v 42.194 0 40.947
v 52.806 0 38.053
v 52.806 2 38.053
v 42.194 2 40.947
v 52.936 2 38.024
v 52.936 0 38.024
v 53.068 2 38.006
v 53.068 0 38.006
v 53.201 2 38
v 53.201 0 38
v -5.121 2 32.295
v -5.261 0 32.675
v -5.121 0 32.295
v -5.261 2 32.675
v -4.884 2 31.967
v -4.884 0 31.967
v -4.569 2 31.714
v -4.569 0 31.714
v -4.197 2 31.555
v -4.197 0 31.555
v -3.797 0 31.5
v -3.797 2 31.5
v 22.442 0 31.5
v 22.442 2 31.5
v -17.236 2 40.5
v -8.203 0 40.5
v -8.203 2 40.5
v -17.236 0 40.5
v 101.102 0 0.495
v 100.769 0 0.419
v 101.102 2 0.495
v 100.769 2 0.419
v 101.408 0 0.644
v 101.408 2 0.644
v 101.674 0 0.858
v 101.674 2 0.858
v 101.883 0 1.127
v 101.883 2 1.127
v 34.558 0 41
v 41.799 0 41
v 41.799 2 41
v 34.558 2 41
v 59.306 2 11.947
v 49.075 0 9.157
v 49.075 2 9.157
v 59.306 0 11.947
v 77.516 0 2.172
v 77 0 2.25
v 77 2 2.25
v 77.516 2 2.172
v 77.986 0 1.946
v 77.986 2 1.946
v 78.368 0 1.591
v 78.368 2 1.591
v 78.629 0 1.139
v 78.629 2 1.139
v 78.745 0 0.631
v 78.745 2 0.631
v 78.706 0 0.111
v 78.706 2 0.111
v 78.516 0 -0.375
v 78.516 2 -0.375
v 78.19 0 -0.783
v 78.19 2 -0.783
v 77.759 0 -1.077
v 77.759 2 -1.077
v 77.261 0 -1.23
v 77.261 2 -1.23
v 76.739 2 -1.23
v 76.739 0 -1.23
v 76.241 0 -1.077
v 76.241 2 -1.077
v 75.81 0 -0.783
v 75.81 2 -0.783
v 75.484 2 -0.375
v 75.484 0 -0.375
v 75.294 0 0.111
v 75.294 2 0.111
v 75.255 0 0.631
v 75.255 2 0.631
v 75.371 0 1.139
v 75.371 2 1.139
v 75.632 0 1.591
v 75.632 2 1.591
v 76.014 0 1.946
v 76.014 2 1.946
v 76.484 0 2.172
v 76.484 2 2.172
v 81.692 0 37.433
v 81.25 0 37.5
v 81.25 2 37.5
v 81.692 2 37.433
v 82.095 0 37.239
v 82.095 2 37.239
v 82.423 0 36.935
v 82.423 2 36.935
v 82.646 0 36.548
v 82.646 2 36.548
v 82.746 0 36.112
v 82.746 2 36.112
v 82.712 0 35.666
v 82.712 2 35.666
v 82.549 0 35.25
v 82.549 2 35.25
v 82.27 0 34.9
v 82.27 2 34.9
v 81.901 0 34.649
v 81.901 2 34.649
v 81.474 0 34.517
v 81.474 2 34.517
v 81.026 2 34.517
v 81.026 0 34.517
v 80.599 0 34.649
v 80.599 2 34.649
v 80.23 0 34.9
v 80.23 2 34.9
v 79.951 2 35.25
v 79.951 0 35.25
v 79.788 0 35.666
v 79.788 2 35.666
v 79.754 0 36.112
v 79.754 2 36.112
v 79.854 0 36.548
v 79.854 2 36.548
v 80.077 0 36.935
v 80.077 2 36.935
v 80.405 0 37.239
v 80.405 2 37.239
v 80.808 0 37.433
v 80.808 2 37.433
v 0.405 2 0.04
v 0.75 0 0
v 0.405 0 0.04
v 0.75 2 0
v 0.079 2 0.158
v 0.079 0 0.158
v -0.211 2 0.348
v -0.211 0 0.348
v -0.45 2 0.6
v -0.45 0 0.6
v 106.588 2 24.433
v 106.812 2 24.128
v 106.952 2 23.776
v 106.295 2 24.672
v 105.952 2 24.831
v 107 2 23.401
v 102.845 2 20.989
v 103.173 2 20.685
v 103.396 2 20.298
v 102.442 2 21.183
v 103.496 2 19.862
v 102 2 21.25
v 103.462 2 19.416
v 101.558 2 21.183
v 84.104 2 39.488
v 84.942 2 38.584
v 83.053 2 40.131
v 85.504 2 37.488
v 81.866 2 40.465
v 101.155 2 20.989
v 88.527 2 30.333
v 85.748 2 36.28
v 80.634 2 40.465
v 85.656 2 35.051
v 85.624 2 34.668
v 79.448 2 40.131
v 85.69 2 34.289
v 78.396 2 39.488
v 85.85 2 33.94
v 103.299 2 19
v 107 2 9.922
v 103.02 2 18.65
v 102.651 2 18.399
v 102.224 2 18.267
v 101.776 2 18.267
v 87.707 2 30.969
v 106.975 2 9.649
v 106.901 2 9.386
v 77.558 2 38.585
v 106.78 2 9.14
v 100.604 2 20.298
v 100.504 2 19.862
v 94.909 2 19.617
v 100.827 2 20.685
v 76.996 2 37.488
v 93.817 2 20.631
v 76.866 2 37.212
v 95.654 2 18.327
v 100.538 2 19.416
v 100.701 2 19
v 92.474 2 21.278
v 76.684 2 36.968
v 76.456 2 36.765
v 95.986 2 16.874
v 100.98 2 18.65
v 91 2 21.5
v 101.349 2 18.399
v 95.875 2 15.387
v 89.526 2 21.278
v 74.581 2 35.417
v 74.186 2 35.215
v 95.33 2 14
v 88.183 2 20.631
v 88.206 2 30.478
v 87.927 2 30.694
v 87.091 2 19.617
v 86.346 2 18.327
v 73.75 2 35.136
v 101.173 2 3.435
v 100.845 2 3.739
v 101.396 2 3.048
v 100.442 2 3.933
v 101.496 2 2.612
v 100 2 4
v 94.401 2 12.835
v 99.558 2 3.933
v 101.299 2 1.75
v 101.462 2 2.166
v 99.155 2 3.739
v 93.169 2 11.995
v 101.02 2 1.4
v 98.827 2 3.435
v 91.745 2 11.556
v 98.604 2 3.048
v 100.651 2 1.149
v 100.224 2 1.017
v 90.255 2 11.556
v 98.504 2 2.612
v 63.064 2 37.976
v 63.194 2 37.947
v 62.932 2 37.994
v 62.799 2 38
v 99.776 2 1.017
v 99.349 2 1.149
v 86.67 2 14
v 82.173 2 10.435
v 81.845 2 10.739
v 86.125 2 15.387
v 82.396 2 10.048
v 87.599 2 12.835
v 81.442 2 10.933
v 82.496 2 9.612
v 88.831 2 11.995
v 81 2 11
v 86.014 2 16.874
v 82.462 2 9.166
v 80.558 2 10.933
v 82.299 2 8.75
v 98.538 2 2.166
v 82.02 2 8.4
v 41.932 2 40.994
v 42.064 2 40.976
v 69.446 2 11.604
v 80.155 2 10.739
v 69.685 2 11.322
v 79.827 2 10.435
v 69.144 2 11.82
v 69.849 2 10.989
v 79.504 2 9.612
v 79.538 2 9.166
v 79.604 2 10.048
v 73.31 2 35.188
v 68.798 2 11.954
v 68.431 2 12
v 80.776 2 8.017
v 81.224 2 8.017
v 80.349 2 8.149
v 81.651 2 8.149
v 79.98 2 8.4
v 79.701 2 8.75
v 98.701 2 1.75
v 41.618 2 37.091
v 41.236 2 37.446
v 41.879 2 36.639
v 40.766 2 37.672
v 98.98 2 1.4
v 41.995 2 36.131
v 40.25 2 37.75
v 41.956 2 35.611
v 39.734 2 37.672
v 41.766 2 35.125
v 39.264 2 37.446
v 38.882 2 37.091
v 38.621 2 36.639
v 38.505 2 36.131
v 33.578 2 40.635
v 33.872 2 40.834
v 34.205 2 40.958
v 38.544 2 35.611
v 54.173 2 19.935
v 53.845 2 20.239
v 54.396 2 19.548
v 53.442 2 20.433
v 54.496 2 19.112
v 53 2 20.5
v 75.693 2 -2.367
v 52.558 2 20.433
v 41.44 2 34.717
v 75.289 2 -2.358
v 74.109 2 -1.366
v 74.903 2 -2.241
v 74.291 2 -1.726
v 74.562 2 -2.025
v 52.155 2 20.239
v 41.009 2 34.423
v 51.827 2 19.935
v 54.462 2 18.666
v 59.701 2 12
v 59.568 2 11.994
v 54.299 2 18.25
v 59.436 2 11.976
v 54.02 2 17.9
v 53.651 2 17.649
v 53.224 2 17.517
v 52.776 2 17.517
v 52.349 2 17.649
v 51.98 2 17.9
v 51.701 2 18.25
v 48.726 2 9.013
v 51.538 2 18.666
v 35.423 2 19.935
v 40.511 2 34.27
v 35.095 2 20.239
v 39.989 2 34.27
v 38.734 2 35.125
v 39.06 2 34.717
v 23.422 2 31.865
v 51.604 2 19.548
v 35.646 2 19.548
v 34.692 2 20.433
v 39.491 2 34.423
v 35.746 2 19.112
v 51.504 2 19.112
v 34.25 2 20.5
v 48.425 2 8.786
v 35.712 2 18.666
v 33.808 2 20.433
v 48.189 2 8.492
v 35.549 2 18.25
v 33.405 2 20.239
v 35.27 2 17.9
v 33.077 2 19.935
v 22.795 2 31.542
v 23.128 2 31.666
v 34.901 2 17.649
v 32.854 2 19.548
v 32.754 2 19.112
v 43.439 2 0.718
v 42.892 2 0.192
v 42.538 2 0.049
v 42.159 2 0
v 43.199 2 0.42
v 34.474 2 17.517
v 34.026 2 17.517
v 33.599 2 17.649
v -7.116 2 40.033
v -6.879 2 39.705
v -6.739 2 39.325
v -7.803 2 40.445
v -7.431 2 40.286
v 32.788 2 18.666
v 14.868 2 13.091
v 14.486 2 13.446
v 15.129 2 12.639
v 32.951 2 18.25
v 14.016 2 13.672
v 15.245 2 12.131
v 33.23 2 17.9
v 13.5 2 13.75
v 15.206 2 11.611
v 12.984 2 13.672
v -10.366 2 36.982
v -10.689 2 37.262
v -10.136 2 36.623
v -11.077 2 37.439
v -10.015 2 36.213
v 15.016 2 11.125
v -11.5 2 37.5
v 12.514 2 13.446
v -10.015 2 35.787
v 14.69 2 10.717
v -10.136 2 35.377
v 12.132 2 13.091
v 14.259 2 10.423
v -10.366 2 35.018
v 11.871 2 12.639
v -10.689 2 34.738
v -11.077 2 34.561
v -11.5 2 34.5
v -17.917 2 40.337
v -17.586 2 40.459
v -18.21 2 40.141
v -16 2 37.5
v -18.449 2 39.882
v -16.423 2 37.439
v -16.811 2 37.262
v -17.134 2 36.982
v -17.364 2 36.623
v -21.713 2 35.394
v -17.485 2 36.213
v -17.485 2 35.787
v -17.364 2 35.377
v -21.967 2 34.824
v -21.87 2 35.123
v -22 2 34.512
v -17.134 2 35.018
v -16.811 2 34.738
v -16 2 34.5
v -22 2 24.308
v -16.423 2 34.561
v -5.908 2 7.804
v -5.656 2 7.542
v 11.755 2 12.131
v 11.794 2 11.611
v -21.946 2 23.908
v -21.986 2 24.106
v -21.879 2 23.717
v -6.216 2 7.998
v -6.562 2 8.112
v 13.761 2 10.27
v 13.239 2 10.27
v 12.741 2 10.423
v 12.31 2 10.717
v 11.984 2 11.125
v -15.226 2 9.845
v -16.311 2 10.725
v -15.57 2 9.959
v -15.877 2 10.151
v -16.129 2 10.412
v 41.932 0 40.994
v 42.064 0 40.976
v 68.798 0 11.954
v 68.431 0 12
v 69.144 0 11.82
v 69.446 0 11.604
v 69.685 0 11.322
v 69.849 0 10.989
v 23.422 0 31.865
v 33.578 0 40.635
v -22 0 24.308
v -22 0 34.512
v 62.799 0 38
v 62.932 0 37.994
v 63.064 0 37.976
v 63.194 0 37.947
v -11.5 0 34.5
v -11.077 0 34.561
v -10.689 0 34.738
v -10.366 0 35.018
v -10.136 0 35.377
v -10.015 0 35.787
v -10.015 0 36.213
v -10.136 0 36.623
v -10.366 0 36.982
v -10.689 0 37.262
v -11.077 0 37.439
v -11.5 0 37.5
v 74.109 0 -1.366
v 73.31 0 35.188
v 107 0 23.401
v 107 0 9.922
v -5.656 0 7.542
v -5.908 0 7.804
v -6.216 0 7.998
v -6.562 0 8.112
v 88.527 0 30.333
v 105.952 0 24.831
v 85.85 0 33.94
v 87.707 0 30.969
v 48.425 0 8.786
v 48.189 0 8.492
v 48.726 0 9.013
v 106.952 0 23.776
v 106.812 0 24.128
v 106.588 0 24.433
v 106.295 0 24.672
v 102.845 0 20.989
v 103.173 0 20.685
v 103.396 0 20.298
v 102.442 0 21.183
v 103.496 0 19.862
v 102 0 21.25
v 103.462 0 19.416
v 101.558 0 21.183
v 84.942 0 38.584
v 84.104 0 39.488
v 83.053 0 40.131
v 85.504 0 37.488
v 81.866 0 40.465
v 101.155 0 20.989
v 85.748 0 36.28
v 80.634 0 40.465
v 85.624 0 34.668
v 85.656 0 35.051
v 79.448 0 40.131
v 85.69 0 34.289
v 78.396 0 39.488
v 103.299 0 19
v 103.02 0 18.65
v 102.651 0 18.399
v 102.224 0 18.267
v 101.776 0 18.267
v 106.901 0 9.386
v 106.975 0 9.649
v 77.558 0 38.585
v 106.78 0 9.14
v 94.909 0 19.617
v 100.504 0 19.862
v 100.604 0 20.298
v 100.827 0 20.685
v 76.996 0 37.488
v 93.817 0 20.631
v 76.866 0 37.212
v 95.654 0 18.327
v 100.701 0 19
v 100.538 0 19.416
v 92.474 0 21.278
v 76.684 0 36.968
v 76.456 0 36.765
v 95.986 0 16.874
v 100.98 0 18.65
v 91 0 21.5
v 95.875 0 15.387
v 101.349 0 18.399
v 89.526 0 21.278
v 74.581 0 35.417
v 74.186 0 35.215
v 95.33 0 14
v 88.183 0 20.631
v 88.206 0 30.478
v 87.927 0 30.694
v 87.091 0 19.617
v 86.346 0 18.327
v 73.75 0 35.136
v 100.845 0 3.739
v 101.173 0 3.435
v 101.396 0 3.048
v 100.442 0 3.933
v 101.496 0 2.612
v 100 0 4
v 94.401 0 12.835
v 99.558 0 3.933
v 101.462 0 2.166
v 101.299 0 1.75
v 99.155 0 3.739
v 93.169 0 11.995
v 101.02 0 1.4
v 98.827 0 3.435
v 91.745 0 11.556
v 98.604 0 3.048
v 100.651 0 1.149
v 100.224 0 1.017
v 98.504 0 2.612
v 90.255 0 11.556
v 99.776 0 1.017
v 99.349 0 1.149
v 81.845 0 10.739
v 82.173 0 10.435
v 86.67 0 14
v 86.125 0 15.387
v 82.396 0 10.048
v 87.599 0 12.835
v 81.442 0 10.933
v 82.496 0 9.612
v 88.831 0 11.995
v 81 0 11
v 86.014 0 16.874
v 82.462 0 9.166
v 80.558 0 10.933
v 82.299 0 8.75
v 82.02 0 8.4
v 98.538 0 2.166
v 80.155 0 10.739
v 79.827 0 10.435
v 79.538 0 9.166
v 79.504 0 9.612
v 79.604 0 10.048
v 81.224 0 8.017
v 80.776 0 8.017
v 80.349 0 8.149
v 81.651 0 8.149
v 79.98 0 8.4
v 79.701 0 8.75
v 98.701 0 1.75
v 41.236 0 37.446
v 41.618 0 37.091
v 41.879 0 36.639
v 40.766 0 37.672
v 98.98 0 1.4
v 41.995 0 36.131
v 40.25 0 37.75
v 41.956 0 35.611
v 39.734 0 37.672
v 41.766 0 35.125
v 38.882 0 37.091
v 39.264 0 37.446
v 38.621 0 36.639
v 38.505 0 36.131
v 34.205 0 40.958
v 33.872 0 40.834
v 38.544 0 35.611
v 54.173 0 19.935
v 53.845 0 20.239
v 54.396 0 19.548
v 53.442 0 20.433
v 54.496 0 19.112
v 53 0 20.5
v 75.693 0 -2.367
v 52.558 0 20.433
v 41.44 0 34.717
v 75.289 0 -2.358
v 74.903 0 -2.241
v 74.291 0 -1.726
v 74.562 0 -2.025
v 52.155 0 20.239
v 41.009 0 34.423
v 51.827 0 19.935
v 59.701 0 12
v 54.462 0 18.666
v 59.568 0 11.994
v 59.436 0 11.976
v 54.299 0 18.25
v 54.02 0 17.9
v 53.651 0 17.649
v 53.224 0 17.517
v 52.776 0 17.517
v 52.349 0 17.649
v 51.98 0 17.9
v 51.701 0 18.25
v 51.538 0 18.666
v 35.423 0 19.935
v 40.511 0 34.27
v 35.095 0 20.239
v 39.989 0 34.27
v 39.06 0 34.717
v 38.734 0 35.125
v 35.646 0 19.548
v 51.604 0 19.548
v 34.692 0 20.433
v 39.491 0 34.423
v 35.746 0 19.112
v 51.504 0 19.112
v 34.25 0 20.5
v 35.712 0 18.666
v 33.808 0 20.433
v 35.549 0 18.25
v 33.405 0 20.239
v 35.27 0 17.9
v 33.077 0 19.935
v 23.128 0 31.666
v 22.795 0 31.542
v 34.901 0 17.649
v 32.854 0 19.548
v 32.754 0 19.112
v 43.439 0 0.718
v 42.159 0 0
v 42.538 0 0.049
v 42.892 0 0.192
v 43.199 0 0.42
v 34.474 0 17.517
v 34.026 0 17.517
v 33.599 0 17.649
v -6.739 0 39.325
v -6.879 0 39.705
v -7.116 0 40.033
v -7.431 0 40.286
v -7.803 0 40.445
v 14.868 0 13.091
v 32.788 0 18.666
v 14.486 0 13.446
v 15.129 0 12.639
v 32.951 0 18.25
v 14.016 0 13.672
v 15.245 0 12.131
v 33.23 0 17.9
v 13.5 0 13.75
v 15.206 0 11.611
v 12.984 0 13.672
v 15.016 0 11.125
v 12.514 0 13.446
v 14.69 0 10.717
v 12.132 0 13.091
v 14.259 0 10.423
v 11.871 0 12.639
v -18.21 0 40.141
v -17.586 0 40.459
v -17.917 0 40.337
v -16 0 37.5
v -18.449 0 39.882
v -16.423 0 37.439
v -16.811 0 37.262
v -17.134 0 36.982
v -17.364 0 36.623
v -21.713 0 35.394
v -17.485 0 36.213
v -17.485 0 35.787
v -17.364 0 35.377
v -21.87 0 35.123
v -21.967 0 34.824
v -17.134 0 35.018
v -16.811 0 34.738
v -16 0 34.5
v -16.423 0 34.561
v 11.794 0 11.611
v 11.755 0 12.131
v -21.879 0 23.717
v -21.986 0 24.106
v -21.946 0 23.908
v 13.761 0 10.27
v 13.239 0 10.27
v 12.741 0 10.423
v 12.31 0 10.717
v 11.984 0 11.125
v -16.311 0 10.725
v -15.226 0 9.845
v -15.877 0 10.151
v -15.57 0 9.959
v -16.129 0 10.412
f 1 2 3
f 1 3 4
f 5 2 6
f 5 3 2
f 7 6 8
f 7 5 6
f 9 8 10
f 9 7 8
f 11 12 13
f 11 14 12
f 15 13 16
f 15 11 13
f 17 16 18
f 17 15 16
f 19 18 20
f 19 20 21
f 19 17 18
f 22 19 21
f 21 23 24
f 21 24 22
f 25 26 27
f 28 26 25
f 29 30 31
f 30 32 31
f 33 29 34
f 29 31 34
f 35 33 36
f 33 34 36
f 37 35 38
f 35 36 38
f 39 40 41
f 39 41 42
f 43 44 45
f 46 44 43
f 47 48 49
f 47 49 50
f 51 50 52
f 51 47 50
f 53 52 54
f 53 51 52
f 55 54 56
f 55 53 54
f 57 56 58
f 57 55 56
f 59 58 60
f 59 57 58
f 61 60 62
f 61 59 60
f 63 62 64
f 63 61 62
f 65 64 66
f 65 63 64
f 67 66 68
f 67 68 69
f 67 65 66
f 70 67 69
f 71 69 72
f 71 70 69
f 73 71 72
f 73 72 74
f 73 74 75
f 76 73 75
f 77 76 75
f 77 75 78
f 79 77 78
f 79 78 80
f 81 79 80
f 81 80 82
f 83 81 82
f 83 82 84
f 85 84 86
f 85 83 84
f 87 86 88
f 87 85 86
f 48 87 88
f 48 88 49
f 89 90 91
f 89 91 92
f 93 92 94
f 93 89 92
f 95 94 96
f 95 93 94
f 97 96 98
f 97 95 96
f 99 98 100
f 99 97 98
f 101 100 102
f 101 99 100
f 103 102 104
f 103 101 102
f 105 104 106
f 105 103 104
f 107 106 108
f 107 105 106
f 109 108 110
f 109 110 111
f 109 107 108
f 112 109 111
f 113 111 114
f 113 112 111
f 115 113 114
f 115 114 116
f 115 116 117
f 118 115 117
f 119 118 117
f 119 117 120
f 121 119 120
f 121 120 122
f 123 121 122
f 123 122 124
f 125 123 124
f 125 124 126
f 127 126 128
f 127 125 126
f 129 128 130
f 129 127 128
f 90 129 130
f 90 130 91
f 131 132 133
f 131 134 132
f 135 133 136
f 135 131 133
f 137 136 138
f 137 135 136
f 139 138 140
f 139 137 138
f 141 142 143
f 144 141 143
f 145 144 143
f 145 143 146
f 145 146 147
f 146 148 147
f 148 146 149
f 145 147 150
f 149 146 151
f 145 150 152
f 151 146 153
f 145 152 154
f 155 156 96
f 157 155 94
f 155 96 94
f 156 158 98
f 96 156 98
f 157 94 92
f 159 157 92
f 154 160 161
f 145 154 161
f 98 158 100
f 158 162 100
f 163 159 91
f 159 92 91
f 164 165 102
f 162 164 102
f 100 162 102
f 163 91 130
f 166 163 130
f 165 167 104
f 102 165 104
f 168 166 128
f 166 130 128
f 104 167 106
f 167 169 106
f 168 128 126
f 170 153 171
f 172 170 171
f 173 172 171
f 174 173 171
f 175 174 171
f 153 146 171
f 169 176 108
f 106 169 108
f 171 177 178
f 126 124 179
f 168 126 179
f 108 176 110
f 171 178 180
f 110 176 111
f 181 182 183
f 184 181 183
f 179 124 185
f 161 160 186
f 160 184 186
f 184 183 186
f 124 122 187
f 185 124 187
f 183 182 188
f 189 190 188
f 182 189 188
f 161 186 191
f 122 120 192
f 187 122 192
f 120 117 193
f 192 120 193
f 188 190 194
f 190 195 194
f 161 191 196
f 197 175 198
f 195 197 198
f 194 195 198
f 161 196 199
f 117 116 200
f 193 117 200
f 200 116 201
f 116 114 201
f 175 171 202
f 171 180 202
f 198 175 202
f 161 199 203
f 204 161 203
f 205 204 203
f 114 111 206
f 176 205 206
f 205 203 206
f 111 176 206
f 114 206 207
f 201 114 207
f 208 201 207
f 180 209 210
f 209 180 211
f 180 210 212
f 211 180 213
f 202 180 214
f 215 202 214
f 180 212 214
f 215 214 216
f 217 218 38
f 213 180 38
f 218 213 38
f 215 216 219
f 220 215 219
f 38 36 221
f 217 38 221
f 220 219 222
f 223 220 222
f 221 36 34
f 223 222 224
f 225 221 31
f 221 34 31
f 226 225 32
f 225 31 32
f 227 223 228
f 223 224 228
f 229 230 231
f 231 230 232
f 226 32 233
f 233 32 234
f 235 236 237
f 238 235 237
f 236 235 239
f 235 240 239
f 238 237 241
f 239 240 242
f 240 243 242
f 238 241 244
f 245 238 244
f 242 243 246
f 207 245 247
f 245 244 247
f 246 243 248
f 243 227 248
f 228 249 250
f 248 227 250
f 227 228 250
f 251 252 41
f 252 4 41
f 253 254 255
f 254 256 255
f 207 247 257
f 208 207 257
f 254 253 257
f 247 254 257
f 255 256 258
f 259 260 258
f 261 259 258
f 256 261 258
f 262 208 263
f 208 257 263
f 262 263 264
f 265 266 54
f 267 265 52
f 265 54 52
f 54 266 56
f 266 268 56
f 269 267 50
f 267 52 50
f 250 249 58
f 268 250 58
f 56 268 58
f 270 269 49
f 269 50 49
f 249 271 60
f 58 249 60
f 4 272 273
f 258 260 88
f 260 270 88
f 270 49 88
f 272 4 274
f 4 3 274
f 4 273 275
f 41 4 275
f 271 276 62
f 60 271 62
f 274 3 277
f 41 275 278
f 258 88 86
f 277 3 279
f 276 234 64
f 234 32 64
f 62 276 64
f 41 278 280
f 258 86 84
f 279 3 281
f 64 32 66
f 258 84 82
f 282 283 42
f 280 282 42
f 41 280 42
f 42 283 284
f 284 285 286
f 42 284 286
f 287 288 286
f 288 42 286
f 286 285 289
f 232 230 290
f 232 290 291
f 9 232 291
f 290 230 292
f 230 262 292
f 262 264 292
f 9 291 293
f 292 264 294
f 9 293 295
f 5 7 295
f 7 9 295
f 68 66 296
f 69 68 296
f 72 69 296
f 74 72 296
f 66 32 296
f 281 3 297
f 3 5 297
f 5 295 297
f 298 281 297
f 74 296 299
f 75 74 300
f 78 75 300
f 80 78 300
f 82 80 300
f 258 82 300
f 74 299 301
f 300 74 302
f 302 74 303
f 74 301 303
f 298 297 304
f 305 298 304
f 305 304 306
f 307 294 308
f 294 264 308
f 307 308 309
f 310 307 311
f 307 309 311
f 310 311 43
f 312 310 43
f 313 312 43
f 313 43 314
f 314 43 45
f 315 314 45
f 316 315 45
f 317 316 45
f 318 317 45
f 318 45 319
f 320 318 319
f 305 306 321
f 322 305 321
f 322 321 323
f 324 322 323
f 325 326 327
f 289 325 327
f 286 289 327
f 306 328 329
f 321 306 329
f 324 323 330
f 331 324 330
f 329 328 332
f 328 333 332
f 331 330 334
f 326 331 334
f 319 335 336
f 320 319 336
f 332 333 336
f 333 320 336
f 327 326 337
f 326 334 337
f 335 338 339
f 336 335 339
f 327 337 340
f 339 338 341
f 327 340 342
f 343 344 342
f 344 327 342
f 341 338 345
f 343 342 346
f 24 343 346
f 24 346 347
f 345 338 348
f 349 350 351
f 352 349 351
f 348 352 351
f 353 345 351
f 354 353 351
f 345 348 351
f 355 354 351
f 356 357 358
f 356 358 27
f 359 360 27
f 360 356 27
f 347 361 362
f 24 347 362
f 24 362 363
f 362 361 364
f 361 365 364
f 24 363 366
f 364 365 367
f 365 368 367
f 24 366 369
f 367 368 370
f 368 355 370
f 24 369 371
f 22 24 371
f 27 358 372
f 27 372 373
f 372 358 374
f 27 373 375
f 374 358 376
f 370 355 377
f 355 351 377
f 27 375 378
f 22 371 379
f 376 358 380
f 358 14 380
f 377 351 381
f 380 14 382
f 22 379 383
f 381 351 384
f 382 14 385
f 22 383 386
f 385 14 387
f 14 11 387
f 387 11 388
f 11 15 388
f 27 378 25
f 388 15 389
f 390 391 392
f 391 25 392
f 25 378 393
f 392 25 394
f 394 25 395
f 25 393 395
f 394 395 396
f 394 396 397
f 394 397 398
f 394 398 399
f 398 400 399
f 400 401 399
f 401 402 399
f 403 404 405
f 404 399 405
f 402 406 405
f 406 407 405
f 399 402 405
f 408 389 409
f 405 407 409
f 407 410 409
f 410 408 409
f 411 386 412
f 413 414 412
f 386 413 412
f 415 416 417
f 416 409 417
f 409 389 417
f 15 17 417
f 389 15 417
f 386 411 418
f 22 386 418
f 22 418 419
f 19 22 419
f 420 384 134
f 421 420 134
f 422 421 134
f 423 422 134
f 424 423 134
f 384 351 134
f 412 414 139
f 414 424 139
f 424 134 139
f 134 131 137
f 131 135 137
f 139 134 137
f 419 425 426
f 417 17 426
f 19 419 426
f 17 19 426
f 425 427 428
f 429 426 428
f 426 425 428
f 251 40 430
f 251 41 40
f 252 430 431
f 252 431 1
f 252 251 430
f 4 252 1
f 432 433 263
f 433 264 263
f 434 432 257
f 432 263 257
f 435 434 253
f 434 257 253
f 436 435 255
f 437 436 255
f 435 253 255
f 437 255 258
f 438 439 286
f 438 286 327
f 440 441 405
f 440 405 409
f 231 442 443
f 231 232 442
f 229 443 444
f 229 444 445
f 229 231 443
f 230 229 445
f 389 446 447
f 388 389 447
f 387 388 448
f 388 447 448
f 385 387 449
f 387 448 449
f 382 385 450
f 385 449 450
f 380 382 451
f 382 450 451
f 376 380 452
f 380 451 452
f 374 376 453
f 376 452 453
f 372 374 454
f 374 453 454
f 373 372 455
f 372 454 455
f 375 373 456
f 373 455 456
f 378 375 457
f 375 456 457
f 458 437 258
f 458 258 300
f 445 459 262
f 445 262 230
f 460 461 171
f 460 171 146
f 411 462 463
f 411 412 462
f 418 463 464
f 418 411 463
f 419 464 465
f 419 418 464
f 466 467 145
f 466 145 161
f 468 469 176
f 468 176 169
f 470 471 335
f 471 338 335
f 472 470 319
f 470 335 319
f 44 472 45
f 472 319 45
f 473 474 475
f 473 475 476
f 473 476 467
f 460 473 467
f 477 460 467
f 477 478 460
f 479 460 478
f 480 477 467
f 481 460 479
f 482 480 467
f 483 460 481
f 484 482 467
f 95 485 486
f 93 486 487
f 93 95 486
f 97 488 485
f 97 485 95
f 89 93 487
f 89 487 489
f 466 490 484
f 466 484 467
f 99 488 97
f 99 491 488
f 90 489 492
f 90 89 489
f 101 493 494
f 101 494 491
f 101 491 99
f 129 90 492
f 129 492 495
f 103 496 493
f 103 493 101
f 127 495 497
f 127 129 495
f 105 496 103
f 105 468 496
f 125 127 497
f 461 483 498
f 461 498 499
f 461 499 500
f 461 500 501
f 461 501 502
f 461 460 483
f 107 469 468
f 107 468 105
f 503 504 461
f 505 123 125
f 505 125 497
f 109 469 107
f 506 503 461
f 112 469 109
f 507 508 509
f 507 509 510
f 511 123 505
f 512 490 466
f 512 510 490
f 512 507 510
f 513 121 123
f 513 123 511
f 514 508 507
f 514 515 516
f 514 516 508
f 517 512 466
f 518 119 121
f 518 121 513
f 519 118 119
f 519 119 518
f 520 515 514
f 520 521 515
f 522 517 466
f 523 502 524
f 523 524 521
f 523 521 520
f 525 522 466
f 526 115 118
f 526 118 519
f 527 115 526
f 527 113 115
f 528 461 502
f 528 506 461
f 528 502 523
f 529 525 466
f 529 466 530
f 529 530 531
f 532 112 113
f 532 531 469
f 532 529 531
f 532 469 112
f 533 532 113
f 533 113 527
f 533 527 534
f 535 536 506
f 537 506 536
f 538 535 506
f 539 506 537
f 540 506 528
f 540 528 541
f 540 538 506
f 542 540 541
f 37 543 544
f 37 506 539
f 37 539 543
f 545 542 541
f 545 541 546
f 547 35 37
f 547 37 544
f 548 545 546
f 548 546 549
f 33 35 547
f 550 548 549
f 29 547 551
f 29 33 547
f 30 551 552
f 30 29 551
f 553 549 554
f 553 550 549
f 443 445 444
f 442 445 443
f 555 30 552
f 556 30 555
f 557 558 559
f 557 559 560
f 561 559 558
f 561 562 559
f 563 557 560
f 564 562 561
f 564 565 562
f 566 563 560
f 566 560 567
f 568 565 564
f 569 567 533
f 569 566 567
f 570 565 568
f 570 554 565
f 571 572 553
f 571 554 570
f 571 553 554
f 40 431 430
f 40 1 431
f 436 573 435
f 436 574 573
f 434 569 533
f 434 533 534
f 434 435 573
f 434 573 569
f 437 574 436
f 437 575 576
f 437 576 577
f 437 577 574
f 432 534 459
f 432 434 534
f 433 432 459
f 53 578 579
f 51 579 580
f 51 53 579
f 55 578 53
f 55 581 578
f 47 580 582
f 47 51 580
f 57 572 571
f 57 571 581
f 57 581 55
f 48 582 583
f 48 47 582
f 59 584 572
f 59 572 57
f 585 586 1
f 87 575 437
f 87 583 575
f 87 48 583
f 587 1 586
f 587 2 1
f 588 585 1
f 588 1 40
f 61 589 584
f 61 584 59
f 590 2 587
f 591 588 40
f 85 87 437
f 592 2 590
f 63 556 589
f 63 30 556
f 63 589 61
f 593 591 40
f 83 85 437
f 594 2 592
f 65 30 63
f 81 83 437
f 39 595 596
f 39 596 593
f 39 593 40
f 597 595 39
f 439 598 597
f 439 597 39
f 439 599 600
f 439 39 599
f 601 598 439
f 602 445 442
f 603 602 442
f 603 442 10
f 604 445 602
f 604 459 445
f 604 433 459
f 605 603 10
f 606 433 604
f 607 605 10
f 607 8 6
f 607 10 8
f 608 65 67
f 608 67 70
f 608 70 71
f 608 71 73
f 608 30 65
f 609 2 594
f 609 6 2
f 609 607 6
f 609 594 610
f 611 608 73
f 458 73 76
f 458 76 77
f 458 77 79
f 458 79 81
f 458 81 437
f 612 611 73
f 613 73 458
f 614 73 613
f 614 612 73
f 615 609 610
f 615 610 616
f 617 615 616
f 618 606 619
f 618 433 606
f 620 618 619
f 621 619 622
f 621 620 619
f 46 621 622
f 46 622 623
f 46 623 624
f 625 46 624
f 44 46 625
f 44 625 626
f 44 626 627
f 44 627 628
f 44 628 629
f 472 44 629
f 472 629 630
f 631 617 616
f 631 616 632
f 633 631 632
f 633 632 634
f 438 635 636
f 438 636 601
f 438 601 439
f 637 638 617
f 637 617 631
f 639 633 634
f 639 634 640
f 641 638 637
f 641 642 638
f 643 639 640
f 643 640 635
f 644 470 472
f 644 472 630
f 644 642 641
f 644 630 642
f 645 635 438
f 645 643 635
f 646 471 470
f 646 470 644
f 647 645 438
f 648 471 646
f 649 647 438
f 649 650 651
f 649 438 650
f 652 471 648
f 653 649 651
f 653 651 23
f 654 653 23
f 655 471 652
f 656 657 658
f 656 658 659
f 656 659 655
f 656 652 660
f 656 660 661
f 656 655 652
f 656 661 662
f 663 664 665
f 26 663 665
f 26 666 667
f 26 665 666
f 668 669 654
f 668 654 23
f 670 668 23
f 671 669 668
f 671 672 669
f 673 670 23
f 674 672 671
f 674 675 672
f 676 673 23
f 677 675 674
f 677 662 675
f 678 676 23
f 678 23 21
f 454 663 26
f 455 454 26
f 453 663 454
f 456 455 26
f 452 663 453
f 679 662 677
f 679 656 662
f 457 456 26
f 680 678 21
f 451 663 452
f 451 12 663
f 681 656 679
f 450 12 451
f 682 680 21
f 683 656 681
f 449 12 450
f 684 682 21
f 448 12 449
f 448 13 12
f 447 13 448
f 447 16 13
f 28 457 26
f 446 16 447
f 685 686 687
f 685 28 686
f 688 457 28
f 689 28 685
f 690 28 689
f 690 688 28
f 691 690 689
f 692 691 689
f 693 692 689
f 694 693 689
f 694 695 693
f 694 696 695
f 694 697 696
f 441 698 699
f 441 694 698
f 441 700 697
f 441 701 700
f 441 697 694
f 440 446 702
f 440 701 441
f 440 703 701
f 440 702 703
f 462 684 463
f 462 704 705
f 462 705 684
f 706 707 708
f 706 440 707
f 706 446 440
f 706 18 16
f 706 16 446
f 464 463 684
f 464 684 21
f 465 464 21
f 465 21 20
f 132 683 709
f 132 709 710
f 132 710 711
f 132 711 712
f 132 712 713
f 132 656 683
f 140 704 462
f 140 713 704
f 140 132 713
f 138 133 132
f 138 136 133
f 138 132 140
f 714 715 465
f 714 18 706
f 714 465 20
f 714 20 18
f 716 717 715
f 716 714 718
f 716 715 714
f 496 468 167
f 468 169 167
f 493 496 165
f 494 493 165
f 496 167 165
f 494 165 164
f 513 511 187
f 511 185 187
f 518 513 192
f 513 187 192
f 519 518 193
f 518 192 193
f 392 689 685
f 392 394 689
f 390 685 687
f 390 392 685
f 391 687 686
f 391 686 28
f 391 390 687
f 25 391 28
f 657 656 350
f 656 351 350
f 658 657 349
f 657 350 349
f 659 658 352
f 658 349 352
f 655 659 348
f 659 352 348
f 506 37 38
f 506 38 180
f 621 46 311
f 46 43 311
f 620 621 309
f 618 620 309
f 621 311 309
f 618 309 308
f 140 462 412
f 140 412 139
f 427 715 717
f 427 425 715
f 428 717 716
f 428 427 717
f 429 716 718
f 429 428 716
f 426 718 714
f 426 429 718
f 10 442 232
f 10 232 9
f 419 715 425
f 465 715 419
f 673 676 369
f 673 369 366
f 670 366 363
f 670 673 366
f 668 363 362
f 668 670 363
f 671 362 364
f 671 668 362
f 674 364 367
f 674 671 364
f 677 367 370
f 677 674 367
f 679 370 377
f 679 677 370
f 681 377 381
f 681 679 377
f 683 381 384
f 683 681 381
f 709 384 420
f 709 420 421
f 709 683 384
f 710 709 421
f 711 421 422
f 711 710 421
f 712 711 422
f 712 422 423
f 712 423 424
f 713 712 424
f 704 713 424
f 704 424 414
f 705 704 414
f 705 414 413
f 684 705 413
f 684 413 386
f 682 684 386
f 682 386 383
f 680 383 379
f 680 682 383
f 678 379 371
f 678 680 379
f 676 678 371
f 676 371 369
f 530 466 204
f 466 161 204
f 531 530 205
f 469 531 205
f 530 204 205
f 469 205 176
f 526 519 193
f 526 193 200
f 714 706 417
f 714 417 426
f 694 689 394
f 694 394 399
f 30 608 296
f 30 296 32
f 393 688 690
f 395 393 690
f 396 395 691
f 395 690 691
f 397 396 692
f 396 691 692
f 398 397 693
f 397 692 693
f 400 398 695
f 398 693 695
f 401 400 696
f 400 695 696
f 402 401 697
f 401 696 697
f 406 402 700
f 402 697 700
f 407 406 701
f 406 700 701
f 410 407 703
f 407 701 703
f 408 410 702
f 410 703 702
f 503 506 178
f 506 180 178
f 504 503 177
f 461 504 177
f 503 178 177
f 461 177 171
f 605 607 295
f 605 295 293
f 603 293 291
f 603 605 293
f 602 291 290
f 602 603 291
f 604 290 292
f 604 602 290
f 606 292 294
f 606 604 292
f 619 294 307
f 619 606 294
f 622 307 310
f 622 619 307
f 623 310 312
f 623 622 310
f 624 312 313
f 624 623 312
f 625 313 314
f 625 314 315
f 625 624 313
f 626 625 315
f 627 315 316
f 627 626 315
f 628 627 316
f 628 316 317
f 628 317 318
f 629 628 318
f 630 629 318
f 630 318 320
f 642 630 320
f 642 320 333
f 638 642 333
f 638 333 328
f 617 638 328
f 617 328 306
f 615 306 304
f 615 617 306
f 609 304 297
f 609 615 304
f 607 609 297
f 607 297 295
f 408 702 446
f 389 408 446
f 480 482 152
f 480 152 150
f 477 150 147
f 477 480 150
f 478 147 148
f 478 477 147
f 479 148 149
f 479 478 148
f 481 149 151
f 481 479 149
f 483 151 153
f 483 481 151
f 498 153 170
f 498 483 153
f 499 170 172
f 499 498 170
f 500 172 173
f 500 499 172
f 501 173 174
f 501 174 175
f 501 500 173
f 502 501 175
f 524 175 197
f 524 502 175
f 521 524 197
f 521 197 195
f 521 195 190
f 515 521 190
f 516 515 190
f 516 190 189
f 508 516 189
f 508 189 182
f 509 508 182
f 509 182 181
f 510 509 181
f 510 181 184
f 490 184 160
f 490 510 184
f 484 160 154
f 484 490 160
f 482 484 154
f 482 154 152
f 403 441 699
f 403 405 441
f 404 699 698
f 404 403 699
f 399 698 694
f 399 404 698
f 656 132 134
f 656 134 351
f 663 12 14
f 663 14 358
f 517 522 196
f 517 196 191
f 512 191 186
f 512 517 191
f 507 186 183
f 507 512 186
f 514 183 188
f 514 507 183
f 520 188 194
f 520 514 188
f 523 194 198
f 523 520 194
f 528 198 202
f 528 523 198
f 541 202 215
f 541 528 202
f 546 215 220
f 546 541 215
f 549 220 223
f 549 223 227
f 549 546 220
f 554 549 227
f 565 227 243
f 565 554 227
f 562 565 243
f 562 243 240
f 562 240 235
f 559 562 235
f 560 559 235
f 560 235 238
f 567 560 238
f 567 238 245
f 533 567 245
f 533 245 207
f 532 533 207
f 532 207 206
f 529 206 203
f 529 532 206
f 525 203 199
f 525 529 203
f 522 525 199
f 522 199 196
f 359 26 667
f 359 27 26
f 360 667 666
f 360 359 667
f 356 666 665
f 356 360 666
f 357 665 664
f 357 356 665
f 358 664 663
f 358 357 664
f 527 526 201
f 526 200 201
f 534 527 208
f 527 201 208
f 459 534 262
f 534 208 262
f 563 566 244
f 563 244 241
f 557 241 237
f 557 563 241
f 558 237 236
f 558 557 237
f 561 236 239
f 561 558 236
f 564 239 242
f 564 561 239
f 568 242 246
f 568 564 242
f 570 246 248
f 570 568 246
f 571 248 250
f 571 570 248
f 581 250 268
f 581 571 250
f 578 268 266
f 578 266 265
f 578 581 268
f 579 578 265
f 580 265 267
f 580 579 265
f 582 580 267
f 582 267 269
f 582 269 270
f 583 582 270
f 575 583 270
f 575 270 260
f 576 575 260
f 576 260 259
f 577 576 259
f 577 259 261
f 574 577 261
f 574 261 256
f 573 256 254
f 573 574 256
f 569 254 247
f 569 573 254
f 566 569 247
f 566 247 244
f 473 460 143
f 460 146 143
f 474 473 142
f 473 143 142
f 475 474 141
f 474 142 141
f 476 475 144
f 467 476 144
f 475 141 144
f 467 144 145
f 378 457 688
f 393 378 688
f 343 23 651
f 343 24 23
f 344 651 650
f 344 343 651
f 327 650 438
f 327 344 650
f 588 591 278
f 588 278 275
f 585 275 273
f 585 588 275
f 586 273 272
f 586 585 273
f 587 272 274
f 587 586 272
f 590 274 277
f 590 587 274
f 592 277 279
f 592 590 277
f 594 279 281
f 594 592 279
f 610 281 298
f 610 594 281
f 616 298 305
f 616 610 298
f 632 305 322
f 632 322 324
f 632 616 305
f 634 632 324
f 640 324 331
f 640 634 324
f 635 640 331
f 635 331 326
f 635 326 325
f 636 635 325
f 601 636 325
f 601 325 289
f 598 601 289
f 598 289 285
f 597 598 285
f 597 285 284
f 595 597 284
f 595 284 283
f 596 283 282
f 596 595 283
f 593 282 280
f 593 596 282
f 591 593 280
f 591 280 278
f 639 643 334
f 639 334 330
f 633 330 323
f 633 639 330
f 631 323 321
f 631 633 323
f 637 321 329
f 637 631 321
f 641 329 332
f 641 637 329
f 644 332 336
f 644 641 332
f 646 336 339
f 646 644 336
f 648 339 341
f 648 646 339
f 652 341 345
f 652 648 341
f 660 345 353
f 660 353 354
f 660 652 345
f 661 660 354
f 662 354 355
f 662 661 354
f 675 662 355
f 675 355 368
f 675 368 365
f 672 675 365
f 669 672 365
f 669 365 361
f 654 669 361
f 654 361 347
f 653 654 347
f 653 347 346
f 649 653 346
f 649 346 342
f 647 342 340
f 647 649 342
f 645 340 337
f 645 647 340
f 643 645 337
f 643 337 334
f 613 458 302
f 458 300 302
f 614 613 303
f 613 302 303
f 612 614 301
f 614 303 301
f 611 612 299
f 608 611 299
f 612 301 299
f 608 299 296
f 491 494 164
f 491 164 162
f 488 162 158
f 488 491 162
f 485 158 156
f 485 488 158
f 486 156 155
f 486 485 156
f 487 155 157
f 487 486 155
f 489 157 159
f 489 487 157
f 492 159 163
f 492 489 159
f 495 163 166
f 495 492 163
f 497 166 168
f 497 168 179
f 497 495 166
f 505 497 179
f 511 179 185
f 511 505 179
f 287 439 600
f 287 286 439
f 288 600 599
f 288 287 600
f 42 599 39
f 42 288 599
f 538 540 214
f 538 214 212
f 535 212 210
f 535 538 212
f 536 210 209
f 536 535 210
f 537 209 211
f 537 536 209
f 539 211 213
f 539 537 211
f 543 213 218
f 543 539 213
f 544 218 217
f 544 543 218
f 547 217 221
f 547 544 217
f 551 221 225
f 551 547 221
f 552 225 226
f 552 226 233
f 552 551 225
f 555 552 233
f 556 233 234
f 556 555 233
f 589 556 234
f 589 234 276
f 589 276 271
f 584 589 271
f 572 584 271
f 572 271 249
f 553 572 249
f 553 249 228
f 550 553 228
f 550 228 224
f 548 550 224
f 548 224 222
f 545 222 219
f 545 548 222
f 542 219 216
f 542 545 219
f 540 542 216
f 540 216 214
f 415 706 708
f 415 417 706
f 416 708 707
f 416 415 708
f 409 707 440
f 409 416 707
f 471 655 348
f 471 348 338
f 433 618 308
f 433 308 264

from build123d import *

# Parameters (mm, degrees)
SKETCH1_R           = 1.75
SKETCH1_R_2         = 1.5
SKETCH1_R_3         = 5
BOSS_EXTRUDE1_DEPTH = 2
FILLET1_R           = 1.5


with BuildPart() as part:
    # Sketch1 → Boss-Extrude1 (new body)
    with BuildSketch(Plane(origin=(0, 0, 0), x_dir=(1, 0, 0), z_dir=(0, 1, 0))):
        with BuildLine():
            Line((0, 0), (43, 0))
            Line((43, 0), (48.5, -9))
            Line((48.5, -9), (59.5, -12))
            Line((59.5, -12), (69.5, -12))
            Line((69.5, -12), (74.5, 2.5))
            Line((74.5, 2.5), (101.5, -0.5))
            Line((101.5, -0.5), (107, -9.5))
            Line((107, -9.5), (107, -24.5))
            Line((107, -24.5), (88, -30.5))
            Line((88, -30.5), (85.5, -34.5))
            ThreePointArc((85.5, -34.5), (82.533474843, -40.320323174), (76.870377201, -37.063674828))
            Line((76.870377201, -37.063674828), (74, -35))
            Line((74, -35), (63, -38))
            Line((63, -38), (53, -38))
            Line((53, -38), (42, -41))
            Line((42, -41), (34, -41))
            Line((34, -41), (23, -31.5))
            Line((23, -31.5), (-5, -31.5))
            Line((-5, -31.5), (-7, -40.5))
            Line((-7, -40.5), (-18, -40.5))
            Line((-18, -40.5), (-22, -35))
            Line((-22, -35), (-22, -24))
            Line((-22, -24), (-16, -10))
            Line((-16, -10), (-6, -8))
            Line((-6, -8), (0, 0))
        make_face()
        with Locations(Location((40.25, -36, 0), (0, 0, 270))):
            Circle(SKETCH1_R, mode=Mode.SUBTRACT)
        with Locations(Location((81.25, -36, 0), (0, 0, 270))):
            Circle(SKETCH1_R_2, mode=Mode.SUBTRACT)
        with Locations(Location((91, -16.5, 0), (0, 0, 270))):
            Circle(SKETCH1_R_3, mode=Mode.SUBTRACT)
        with Locations(Location((77, -0.5, 0), (0, 0, 270))):
            Circle(SKETCH1_R, mode=Mode.SUBTRACT)
        with Locations(Location((81, -9.5, 0), (0, 0, 270))):
            Circle(SKETCH1_R_2, mode=Mode.SUBTRACT)
        with Locations(Location((100, -2.5, 0), (0, 0, 270))):
            Circle(SKETCH1_R_2, mode=Mode.SUBTRACT)
        with Locations(Location((102, -19.75, 0), (0, 0, 270))):
            Circle(SKETCH1_R_2, mode=Mode.SUBTRACT)
        with Locations(Location((53, -19, 0), (0, 0, 270))):
            Circle(SKETCH1_R_2, mode=Mode.SUBTRACT)
        with Locations(Location((34.25, -19, 0), (0, 0, 270))):
            Circle(SKETCH1_R_2, mode=Mode.SUBTRACT)
        with Locations(Location((13.5, -12, 0), (0, 0, 270))):
            Circle(SKETCH1_R, mode=Mode.SUBTRACT)
        with BuildLine():
            Line((-16, -34.5), (-11.5, -34.5))
            ThreePointArc((-11.5, -34.5), (-10, -36), (-11.5, -37.5))
            Line((-11.5, -37.5), (-16, -37.5))
            ThreePointArc((-16, -37.5), (-17.5, -36), (-16, -34.5))
        make_face(mode=Mode.SUBTRACT)
    extrude(amount=BOSS_EXTRUDE1_DEPTH)

    # Fillet1
    fillet1_edges = [part.edges().sort_by_distance(p)[0] for p in [
        (0, 1, 0),
        (43, 1, 0),
        (48.5, 1, 9),
        (59.5, 1, 12),
        (69.5, 1, 12),
        (74.5, 1, -2.5),
        (101.5, 1, 0.5),
        (107, 1, 9.5),
        (107, 1, 24.5),
        (88, 1, 30.5),
        (85.5, 1, 34.5),
        (76.870377201, 1, 37.063674828),
        (74, 1, 35),
        (63, 1, 38),
        (53, 1, 38),
        (42, 1, 41),
        (34, 1, 41),
        (23, 1, 31.5),
        (-5, 1, 31.5),
        (-7, 1, 40.5),
        (-18, 1, 40.5),
        (-22, 1, 35),
        (-22, 1, 24),
        (-16, 1, 10),
        (-6, 1, 8),
    ]]
    fillet(fillet1_edges, radius=FILLET1_R)


solid = part.part
